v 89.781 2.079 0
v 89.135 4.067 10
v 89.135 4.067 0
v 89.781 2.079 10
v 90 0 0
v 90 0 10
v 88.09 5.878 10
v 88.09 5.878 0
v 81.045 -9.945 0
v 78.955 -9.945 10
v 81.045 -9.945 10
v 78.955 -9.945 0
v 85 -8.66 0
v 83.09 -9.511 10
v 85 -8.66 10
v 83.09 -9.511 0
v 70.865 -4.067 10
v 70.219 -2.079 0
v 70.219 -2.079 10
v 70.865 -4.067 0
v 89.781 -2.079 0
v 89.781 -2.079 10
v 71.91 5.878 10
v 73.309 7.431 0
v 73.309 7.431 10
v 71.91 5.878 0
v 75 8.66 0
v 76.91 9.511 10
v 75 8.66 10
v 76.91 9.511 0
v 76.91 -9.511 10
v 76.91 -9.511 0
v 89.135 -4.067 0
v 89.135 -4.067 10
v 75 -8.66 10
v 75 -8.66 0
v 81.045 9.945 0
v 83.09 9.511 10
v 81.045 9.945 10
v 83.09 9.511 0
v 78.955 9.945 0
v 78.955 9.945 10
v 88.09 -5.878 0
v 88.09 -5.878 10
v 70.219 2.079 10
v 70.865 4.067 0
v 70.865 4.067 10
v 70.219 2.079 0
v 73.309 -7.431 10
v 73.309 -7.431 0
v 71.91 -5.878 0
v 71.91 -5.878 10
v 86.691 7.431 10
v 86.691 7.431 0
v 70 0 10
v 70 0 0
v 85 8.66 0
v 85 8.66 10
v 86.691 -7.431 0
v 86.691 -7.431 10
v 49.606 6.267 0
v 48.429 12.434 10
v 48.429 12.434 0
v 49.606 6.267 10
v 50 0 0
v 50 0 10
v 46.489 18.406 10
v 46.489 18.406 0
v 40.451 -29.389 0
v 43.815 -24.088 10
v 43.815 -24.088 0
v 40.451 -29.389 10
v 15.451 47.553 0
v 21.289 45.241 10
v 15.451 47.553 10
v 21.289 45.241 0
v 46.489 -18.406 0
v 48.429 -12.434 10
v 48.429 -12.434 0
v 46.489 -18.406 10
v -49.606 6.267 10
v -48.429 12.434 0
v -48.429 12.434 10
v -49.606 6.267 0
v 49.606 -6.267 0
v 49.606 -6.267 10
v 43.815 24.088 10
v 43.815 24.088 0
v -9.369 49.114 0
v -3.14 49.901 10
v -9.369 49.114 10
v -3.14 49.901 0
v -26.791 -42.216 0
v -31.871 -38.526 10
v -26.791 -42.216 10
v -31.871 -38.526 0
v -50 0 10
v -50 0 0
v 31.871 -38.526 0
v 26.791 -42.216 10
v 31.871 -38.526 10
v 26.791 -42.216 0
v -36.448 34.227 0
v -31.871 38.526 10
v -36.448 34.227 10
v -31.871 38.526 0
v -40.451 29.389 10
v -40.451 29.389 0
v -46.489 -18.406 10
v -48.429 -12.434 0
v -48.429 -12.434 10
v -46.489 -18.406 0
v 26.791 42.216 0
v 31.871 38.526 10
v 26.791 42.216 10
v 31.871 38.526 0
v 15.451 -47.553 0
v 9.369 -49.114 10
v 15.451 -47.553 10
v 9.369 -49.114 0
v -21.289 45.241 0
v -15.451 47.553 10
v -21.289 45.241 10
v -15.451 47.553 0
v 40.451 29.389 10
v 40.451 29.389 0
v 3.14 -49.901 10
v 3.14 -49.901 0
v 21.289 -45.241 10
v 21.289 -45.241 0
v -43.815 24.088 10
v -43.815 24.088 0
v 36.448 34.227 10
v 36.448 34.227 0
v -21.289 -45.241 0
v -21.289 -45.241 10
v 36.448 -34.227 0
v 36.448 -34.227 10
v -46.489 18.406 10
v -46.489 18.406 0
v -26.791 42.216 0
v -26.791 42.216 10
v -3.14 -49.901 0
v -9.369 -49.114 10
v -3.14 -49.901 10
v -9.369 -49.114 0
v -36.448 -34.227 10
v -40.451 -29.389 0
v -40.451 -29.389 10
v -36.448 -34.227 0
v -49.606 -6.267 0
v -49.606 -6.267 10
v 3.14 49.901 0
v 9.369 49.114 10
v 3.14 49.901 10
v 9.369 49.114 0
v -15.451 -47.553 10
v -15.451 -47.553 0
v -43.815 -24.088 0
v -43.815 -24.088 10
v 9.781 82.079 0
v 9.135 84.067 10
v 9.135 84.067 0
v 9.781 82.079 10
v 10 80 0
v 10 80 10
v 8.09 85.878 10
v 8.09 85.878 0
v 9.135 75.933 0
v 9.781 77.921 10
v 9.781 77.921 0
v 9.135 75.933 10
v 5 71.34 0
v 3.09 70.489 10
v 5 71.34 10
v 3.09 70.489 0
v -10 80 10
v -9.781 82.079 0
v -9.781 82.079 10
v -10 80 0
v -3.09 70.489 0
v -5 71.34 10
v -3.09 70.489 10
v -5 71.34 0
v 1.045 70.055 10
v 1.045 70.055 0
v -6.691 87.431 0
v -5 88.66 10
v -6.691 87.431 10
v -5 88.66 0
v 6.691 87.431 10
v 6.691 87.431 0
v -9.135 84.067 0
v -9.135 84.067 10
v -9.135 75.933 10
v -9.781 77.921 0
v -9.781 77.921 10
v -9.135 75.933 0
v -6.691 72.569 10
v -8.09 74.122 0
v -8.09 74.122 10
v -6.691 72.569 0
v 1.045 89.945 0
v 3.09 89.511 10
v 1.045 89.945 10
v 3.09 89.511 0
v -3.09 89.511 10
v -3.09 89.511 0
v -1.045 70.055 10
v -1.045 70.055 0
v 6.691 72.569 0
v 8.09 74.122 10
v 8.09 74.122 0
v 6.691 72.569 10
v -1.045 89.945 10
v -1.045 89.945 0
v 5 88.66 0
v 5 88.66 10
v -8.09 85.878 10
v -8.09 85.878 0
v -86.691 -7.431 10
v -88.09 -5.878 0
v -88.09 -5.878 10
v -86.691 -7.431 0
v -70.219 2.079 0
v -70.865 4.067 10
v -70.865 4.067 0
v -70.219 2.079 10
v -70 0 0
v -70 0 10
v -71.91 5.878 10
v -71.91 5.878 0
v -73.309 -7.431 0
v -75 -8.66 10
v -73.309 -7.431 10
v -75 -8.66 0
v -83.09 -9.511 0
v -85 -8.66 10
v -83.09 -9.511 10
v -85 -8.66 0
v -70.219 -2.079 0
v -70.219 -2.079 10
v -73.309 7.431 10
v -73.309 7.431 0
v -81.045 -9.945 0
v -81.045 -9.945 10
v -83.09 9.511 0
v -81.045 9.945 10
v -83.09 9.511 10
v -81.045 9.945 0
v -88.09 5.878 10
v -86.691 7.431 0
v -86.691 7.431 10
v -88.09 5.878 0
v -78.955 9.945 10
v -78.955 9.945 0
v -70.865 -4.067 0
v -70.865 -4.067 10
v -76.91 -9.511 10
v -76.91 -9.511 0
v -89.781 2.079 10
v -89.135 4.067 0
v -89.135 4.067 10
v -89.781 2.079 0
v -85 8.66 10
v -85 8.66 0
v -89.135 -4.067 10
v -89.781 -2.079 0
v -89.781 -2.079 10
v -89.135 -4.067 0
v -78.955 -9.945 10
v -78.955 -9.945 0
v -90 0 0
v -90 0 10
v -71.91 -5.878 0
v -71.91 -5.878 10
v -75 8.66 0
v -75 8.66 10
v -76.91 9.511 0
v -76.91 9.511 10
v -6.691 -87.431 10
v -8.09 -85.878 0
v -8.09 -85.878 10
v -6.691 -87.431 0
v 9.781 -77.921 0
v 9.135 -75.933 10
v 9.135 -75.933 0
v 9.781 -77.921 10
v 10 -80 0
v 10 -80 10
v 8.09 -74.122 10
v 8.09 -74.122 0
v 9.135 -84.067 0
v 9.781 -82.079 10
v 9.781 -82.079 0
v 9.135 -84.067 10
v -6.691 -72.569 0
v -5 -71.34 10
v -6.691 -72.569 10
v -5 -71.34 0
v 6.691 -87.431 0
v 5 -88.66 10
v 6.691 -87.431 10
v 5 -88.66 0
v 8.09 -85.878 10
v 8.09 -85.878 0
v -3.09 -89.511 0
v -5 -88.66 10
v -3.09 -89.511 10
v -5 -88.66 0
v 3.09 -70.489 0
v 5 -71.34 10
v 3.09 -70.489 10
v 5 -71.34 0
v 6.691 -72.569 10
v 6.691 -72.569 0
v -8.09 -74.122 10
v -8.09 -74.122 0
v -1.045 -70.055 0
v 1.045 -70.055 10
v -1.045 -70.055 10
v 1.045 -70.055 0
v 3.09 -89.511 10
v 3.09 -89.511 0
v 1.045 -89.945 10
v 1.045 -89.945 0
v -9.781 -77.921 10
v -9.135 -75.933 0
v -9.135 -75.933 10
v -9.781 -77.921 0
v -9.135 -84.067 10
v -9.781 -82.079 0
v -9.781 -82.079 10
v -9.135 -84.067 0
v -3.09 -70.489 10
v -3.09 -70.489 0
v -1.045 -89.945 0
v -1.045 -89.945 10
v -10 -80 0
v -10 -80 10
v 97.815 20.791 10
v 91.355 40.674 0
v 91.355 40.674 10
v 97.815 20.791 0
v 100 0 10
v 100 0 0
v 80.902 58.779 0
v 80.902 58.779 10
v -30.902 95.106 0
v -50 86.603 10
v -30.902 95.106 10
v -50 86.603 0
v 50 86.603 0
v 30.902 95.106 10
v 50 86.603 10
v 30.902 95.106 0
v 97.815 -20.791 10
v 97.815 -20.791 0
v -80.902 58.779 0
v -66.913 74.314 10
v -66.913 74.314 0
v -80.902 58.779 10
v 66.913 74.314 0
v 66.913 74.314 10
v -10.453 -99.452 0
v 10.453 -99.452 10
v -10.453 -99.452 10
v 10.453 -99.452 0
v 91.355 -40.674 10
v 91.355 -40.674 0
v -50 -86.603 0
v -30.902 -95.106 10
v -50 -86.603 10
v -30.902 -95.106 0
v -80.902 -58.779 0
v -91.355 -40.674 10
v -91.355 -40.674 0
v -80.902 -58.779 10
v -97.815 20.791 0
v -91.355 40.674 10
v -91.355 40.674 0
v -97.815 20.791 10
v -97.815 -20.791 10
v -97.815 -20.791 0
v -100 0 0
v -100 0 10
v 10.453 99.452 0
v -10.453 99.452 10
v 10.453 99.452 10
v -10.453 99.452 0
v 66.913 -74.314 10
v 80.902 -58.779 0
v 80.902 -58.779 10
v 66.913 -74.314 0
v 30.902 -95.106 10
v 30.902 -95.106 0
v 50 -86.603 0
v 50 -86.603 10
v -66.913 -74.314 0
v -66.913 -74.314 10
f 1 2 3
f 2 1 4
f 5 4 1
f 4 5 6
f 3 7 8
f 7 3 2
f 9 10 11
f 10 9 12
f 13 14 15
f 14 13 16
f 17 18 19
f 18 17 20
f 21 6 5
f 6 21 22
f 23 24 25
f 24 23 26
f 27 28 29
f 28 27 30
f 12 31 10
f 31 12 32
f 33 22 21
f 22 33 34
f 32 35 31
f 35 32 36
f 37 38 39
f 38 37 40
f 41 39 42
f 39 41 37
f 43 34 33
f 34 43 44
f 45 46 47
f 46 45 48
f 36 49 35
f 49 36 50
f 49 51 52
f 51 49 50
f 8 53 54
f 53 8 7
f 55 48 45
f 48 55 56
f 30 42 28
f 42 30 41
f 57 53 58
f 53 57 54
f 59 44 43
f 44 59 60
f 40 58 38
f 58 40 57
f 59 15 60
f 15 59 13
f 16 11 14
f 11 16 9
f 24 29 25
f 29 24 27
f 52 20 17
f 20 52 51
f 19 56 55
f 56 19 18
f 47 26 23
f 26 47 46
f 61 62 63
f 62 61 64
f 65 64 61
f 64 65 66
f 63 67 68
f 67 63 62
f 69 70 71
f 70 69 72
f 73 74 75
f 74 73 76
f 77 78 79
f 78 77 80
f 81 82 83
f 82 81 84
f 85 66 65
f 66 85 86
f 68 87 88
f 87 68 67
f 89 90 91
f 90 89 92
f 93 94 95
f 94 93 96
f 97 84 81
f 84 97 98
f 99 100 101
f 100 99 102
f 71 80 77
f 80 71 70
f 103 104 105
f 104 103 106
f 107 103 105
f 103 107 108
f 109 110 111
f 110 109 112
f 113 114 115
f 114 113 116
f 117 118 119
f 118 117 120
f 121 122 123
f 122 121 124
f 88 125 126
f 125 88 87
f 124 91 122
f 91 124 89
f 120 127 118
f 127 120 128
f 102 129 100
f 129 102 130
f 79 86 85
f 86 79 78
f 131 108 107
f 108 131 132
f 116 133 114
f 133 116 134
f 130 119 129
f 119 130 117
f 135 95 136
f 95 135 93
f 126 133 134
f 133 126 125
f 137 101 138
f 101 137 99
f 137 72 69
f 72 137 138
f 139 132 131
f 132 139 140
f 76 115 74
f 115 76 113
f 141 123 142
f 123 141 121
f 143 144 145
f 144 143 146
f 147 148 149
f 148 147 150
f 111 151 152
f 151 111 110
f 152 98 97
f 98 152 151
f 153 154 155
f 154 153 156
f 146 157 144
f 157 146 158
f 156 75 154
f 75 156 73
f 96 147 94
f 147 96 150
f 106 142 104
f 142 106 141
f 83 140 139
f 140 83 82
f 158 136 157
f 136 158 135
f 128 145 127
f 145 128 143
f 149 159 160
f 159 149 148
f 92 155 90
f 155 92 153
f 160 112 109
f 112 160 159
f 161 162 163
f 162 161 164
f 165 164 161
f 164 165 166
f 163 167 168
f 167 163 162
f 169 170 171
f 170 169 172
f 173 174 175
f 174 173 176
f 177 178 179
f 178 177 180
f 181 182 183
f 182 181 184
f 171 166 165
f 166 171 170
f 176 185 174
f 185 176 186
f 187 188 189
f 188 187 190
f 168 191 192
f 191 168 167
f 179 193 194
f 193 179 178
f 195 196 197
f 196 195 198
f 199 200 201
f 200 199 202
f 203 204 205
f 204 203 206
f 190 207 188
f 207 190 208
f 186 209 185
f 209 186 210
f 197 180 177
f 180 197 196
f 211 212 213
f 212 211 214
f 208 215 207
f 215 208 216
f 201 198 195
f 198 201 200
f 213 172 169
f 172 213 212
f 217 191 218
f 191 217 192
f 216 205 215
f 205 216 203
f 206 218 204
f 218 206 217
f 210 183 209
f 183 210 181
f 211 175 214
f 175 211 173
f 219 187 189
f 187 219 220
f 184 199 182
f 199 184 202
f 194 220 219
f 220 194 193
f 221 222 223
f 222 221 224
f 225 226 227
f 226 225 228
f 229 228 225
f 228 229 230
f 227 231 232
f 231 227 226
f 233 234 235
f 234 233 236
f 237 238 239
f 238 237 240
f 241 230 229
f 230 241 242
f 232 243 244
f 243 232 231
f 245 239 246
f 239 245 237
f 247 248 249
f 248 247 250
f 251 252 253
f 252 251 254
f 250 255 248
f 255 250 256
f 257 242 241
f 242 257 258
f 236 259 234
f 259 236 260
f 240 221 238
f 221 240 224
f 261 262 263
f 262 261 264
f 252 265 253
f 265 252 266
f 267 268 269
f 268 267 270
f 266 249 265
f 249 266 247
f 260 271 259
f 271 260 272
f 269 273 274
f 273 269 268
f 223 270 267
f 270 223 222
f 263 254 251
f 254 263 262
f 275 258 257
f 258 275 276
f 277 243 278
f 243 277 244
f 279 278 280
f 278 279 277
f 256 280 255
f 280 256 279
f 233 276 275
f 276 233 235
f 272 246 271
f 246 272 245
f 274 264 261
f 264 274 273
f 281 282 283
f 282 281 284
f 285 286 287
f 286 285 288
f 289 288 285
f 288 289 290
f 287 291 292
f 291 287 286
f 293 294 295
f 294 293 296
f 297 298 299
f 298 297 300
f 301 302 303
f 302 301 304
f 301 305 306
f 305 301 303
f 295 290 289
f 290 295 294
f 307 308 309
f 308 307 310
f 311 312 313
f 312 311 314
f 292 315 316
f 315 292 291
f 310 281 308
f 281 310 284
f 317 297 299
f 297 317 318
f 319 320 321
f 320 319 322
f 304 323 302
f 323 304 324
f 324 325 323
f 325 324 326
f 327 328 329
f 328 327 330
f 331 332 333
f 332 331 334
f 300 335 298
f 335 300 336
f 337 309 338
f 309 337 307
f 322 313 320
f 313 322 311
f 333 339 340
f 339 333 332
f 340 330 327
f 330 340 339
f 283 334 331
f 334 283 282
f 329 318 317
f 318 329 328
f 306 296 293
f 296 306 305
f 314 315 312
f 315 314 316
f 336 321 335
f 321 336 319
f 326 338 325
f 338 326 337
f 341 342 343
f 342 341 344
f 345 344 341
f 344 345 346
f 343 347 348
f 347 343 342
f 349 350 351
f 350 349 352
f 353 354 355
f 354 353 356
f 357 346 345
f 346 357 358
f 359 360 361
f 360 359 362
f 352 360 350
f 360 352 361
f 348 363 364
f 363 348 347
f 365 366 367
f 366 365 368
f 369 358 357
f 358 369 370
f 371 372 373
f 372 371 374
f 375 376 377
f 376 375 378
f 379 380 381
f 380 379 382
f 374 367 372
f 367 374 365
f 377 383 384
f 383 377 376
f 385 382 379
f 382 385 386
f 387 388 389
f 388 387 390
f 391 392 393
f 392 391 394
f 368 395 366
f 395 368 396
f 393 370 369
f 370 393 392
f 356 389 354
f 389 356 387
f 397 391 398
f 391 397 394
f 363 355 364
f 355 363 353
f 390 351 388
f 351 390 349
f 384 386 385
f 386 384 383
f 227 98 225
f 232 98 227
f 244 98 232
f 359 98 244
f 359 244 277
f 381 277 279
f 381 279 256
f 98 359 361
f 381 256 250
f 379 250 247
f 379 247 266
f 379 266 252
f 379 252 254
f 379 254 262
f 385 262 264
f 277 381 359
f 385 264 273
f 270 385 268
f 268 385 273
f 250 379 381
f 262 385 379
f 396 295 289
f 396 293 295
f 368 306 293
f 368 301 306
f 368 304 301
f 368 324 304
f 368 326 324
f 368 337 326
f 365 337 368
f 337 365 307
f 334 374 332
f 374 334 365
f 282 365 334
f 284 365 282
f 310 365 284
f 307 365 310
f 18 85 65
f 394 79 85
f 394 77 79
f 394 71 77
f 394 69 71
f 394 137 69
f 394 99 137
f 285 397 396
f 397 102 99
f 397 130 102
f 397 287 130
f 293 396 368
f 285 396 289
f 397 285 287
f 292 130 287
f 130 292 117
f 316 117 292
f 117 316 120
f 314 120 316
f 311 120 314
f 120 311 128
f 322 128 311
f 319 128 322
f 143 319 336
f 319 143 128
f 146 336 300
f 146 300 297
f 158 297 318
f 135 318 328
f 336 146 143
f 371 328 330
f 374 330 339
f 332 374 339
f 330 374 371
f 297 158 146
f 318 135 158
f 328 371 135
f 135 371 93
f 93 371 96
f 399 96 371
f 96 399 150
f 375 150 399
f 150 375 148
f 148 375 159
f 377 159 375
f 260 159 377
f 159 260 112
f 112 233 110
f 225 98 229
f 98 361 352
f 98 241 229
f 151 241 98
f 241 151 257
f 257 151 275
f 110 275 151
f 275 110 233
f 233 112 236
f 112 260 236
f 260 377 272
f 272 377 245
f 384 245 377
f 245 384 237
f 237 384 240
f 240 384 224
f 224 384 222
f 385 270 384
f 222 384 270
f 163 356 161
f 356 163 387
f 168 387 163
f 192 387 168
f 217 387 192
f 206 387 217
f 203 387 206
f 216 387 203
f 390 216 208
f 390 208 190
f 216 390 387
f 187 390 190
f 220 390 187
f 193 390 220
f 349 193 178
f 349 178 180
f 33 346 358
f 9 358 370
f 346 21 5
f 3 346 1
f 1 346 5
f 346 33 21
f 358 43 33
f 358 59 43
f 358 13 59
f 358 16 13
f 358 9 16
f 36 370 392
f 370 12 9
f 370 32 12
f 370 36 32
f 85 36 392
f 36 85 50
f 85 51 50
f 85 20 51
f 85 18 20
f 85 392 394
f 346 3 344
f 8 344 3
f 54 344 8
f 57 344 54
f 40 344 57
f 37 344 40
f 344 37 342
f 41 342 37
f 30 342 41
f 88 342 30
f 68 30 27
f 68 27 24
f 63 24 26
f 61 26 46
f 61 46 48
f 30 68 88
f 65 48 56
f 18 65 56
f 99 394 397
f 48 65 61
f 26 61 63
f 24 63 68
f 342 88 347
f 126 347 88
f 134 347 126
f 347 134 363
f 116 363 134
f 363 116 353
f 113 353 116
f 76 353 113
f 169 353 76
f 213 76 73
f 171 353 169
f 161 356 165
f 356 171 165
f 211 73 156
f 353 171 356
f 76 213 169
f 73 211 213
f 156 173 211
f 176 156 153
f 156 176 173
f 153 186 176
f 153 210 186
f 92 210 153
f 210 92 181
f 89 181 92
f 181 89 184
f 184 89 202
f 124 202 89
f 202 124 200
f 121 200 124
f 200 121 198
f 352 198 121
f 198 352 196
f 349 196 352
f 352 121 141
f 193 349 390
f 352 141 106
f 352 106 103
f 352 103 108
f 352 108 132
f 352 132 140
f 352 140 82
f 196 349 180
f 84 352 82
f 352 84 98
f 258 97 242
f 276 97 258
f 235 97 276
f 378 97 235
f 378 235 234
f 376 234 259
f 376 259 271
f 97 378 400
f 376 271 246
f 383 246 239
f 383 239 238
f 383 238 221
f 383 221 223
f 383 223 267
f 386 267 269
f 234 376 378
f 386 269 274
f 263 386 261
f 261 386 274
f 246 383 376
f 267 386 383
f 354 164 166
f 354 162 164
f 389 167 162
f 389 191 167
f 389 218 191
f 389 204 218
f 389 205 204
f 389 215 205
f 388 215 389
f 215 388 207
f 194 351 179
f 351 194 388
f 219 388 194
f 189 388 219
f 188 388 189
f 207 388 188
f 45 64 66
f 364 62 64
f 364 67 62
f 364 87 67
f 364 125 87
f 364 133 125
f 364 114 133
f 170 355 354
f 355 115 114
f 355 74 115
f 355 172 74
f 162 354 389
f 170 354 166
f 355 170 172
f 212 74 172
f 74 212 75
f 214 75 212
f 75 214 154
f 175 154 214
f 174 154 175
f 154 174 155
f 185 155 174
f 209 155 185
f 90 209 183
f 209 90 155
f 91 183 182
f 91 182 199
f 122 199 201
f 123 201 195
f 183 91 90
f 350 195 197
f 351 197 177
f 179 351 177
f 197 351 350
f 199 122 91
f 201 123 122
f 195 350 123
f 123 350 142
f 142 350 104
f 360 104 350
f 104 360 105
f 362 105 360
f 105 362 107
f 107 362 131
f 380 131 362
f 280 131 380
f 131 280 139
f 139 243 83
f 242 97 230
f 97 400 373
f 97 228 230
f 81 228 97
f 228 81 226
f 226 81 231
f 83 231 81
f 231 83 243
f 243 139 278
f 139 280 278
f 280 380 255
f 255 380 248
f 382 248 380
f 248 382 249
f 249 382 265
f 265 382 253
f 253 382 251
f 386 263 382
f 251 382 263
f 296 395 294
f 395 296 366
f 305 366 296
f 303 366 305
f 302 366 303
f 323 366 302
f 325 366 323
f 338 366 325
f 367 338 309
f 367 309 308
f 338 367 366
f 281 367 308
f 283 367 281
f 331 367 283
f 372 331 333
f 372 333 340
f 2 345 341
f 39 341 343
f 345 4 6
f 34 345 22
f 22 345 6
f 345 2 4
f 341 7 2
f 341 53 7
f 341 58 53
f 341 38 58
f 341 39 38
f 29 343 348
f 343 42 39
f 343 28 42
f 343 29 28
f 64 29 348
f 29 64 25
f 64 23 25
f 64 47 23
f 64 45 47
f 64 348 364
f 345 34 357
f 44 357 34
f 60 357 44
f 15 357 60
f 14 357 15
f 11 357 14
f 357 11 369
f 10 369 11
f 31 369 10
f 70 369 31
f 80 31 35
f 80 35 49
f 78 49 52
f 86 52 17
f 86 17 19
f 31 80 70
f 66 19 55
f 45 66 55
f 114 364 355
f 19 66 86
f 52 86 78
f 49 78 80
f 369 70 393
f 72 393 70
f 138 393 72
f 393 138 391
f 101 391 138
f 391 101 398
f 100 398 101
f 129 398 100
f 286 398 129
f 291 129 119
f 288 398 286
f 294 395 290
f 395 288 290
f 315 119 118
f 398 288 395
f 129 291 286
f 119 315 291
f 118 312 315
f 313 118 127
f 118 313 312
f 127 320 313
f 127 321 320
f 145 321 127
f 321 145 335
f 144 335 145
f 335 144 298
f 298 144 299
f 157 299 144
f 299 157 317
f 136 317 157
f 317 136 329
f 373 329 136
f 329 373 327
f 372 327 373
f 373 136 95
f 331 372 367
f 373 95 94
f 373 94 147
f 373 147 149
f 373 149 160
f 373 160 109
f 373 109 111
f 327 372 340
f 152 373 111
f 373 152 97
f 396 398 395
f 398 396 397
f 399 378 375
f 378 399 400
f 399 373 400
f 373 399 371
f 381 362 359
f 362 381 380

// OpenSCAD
difference(){
cylinder(10,100,100,$fn=30);

r = 80;
for (i=[0:90:359]) {
    translate([r*cos(i),r*sin(i),-1])
        cylinder(12,10,10,$fn=30);
 
 translate([0,0,-1]) 
 cylinder(12,50,50,$fn=50);   
}

}
